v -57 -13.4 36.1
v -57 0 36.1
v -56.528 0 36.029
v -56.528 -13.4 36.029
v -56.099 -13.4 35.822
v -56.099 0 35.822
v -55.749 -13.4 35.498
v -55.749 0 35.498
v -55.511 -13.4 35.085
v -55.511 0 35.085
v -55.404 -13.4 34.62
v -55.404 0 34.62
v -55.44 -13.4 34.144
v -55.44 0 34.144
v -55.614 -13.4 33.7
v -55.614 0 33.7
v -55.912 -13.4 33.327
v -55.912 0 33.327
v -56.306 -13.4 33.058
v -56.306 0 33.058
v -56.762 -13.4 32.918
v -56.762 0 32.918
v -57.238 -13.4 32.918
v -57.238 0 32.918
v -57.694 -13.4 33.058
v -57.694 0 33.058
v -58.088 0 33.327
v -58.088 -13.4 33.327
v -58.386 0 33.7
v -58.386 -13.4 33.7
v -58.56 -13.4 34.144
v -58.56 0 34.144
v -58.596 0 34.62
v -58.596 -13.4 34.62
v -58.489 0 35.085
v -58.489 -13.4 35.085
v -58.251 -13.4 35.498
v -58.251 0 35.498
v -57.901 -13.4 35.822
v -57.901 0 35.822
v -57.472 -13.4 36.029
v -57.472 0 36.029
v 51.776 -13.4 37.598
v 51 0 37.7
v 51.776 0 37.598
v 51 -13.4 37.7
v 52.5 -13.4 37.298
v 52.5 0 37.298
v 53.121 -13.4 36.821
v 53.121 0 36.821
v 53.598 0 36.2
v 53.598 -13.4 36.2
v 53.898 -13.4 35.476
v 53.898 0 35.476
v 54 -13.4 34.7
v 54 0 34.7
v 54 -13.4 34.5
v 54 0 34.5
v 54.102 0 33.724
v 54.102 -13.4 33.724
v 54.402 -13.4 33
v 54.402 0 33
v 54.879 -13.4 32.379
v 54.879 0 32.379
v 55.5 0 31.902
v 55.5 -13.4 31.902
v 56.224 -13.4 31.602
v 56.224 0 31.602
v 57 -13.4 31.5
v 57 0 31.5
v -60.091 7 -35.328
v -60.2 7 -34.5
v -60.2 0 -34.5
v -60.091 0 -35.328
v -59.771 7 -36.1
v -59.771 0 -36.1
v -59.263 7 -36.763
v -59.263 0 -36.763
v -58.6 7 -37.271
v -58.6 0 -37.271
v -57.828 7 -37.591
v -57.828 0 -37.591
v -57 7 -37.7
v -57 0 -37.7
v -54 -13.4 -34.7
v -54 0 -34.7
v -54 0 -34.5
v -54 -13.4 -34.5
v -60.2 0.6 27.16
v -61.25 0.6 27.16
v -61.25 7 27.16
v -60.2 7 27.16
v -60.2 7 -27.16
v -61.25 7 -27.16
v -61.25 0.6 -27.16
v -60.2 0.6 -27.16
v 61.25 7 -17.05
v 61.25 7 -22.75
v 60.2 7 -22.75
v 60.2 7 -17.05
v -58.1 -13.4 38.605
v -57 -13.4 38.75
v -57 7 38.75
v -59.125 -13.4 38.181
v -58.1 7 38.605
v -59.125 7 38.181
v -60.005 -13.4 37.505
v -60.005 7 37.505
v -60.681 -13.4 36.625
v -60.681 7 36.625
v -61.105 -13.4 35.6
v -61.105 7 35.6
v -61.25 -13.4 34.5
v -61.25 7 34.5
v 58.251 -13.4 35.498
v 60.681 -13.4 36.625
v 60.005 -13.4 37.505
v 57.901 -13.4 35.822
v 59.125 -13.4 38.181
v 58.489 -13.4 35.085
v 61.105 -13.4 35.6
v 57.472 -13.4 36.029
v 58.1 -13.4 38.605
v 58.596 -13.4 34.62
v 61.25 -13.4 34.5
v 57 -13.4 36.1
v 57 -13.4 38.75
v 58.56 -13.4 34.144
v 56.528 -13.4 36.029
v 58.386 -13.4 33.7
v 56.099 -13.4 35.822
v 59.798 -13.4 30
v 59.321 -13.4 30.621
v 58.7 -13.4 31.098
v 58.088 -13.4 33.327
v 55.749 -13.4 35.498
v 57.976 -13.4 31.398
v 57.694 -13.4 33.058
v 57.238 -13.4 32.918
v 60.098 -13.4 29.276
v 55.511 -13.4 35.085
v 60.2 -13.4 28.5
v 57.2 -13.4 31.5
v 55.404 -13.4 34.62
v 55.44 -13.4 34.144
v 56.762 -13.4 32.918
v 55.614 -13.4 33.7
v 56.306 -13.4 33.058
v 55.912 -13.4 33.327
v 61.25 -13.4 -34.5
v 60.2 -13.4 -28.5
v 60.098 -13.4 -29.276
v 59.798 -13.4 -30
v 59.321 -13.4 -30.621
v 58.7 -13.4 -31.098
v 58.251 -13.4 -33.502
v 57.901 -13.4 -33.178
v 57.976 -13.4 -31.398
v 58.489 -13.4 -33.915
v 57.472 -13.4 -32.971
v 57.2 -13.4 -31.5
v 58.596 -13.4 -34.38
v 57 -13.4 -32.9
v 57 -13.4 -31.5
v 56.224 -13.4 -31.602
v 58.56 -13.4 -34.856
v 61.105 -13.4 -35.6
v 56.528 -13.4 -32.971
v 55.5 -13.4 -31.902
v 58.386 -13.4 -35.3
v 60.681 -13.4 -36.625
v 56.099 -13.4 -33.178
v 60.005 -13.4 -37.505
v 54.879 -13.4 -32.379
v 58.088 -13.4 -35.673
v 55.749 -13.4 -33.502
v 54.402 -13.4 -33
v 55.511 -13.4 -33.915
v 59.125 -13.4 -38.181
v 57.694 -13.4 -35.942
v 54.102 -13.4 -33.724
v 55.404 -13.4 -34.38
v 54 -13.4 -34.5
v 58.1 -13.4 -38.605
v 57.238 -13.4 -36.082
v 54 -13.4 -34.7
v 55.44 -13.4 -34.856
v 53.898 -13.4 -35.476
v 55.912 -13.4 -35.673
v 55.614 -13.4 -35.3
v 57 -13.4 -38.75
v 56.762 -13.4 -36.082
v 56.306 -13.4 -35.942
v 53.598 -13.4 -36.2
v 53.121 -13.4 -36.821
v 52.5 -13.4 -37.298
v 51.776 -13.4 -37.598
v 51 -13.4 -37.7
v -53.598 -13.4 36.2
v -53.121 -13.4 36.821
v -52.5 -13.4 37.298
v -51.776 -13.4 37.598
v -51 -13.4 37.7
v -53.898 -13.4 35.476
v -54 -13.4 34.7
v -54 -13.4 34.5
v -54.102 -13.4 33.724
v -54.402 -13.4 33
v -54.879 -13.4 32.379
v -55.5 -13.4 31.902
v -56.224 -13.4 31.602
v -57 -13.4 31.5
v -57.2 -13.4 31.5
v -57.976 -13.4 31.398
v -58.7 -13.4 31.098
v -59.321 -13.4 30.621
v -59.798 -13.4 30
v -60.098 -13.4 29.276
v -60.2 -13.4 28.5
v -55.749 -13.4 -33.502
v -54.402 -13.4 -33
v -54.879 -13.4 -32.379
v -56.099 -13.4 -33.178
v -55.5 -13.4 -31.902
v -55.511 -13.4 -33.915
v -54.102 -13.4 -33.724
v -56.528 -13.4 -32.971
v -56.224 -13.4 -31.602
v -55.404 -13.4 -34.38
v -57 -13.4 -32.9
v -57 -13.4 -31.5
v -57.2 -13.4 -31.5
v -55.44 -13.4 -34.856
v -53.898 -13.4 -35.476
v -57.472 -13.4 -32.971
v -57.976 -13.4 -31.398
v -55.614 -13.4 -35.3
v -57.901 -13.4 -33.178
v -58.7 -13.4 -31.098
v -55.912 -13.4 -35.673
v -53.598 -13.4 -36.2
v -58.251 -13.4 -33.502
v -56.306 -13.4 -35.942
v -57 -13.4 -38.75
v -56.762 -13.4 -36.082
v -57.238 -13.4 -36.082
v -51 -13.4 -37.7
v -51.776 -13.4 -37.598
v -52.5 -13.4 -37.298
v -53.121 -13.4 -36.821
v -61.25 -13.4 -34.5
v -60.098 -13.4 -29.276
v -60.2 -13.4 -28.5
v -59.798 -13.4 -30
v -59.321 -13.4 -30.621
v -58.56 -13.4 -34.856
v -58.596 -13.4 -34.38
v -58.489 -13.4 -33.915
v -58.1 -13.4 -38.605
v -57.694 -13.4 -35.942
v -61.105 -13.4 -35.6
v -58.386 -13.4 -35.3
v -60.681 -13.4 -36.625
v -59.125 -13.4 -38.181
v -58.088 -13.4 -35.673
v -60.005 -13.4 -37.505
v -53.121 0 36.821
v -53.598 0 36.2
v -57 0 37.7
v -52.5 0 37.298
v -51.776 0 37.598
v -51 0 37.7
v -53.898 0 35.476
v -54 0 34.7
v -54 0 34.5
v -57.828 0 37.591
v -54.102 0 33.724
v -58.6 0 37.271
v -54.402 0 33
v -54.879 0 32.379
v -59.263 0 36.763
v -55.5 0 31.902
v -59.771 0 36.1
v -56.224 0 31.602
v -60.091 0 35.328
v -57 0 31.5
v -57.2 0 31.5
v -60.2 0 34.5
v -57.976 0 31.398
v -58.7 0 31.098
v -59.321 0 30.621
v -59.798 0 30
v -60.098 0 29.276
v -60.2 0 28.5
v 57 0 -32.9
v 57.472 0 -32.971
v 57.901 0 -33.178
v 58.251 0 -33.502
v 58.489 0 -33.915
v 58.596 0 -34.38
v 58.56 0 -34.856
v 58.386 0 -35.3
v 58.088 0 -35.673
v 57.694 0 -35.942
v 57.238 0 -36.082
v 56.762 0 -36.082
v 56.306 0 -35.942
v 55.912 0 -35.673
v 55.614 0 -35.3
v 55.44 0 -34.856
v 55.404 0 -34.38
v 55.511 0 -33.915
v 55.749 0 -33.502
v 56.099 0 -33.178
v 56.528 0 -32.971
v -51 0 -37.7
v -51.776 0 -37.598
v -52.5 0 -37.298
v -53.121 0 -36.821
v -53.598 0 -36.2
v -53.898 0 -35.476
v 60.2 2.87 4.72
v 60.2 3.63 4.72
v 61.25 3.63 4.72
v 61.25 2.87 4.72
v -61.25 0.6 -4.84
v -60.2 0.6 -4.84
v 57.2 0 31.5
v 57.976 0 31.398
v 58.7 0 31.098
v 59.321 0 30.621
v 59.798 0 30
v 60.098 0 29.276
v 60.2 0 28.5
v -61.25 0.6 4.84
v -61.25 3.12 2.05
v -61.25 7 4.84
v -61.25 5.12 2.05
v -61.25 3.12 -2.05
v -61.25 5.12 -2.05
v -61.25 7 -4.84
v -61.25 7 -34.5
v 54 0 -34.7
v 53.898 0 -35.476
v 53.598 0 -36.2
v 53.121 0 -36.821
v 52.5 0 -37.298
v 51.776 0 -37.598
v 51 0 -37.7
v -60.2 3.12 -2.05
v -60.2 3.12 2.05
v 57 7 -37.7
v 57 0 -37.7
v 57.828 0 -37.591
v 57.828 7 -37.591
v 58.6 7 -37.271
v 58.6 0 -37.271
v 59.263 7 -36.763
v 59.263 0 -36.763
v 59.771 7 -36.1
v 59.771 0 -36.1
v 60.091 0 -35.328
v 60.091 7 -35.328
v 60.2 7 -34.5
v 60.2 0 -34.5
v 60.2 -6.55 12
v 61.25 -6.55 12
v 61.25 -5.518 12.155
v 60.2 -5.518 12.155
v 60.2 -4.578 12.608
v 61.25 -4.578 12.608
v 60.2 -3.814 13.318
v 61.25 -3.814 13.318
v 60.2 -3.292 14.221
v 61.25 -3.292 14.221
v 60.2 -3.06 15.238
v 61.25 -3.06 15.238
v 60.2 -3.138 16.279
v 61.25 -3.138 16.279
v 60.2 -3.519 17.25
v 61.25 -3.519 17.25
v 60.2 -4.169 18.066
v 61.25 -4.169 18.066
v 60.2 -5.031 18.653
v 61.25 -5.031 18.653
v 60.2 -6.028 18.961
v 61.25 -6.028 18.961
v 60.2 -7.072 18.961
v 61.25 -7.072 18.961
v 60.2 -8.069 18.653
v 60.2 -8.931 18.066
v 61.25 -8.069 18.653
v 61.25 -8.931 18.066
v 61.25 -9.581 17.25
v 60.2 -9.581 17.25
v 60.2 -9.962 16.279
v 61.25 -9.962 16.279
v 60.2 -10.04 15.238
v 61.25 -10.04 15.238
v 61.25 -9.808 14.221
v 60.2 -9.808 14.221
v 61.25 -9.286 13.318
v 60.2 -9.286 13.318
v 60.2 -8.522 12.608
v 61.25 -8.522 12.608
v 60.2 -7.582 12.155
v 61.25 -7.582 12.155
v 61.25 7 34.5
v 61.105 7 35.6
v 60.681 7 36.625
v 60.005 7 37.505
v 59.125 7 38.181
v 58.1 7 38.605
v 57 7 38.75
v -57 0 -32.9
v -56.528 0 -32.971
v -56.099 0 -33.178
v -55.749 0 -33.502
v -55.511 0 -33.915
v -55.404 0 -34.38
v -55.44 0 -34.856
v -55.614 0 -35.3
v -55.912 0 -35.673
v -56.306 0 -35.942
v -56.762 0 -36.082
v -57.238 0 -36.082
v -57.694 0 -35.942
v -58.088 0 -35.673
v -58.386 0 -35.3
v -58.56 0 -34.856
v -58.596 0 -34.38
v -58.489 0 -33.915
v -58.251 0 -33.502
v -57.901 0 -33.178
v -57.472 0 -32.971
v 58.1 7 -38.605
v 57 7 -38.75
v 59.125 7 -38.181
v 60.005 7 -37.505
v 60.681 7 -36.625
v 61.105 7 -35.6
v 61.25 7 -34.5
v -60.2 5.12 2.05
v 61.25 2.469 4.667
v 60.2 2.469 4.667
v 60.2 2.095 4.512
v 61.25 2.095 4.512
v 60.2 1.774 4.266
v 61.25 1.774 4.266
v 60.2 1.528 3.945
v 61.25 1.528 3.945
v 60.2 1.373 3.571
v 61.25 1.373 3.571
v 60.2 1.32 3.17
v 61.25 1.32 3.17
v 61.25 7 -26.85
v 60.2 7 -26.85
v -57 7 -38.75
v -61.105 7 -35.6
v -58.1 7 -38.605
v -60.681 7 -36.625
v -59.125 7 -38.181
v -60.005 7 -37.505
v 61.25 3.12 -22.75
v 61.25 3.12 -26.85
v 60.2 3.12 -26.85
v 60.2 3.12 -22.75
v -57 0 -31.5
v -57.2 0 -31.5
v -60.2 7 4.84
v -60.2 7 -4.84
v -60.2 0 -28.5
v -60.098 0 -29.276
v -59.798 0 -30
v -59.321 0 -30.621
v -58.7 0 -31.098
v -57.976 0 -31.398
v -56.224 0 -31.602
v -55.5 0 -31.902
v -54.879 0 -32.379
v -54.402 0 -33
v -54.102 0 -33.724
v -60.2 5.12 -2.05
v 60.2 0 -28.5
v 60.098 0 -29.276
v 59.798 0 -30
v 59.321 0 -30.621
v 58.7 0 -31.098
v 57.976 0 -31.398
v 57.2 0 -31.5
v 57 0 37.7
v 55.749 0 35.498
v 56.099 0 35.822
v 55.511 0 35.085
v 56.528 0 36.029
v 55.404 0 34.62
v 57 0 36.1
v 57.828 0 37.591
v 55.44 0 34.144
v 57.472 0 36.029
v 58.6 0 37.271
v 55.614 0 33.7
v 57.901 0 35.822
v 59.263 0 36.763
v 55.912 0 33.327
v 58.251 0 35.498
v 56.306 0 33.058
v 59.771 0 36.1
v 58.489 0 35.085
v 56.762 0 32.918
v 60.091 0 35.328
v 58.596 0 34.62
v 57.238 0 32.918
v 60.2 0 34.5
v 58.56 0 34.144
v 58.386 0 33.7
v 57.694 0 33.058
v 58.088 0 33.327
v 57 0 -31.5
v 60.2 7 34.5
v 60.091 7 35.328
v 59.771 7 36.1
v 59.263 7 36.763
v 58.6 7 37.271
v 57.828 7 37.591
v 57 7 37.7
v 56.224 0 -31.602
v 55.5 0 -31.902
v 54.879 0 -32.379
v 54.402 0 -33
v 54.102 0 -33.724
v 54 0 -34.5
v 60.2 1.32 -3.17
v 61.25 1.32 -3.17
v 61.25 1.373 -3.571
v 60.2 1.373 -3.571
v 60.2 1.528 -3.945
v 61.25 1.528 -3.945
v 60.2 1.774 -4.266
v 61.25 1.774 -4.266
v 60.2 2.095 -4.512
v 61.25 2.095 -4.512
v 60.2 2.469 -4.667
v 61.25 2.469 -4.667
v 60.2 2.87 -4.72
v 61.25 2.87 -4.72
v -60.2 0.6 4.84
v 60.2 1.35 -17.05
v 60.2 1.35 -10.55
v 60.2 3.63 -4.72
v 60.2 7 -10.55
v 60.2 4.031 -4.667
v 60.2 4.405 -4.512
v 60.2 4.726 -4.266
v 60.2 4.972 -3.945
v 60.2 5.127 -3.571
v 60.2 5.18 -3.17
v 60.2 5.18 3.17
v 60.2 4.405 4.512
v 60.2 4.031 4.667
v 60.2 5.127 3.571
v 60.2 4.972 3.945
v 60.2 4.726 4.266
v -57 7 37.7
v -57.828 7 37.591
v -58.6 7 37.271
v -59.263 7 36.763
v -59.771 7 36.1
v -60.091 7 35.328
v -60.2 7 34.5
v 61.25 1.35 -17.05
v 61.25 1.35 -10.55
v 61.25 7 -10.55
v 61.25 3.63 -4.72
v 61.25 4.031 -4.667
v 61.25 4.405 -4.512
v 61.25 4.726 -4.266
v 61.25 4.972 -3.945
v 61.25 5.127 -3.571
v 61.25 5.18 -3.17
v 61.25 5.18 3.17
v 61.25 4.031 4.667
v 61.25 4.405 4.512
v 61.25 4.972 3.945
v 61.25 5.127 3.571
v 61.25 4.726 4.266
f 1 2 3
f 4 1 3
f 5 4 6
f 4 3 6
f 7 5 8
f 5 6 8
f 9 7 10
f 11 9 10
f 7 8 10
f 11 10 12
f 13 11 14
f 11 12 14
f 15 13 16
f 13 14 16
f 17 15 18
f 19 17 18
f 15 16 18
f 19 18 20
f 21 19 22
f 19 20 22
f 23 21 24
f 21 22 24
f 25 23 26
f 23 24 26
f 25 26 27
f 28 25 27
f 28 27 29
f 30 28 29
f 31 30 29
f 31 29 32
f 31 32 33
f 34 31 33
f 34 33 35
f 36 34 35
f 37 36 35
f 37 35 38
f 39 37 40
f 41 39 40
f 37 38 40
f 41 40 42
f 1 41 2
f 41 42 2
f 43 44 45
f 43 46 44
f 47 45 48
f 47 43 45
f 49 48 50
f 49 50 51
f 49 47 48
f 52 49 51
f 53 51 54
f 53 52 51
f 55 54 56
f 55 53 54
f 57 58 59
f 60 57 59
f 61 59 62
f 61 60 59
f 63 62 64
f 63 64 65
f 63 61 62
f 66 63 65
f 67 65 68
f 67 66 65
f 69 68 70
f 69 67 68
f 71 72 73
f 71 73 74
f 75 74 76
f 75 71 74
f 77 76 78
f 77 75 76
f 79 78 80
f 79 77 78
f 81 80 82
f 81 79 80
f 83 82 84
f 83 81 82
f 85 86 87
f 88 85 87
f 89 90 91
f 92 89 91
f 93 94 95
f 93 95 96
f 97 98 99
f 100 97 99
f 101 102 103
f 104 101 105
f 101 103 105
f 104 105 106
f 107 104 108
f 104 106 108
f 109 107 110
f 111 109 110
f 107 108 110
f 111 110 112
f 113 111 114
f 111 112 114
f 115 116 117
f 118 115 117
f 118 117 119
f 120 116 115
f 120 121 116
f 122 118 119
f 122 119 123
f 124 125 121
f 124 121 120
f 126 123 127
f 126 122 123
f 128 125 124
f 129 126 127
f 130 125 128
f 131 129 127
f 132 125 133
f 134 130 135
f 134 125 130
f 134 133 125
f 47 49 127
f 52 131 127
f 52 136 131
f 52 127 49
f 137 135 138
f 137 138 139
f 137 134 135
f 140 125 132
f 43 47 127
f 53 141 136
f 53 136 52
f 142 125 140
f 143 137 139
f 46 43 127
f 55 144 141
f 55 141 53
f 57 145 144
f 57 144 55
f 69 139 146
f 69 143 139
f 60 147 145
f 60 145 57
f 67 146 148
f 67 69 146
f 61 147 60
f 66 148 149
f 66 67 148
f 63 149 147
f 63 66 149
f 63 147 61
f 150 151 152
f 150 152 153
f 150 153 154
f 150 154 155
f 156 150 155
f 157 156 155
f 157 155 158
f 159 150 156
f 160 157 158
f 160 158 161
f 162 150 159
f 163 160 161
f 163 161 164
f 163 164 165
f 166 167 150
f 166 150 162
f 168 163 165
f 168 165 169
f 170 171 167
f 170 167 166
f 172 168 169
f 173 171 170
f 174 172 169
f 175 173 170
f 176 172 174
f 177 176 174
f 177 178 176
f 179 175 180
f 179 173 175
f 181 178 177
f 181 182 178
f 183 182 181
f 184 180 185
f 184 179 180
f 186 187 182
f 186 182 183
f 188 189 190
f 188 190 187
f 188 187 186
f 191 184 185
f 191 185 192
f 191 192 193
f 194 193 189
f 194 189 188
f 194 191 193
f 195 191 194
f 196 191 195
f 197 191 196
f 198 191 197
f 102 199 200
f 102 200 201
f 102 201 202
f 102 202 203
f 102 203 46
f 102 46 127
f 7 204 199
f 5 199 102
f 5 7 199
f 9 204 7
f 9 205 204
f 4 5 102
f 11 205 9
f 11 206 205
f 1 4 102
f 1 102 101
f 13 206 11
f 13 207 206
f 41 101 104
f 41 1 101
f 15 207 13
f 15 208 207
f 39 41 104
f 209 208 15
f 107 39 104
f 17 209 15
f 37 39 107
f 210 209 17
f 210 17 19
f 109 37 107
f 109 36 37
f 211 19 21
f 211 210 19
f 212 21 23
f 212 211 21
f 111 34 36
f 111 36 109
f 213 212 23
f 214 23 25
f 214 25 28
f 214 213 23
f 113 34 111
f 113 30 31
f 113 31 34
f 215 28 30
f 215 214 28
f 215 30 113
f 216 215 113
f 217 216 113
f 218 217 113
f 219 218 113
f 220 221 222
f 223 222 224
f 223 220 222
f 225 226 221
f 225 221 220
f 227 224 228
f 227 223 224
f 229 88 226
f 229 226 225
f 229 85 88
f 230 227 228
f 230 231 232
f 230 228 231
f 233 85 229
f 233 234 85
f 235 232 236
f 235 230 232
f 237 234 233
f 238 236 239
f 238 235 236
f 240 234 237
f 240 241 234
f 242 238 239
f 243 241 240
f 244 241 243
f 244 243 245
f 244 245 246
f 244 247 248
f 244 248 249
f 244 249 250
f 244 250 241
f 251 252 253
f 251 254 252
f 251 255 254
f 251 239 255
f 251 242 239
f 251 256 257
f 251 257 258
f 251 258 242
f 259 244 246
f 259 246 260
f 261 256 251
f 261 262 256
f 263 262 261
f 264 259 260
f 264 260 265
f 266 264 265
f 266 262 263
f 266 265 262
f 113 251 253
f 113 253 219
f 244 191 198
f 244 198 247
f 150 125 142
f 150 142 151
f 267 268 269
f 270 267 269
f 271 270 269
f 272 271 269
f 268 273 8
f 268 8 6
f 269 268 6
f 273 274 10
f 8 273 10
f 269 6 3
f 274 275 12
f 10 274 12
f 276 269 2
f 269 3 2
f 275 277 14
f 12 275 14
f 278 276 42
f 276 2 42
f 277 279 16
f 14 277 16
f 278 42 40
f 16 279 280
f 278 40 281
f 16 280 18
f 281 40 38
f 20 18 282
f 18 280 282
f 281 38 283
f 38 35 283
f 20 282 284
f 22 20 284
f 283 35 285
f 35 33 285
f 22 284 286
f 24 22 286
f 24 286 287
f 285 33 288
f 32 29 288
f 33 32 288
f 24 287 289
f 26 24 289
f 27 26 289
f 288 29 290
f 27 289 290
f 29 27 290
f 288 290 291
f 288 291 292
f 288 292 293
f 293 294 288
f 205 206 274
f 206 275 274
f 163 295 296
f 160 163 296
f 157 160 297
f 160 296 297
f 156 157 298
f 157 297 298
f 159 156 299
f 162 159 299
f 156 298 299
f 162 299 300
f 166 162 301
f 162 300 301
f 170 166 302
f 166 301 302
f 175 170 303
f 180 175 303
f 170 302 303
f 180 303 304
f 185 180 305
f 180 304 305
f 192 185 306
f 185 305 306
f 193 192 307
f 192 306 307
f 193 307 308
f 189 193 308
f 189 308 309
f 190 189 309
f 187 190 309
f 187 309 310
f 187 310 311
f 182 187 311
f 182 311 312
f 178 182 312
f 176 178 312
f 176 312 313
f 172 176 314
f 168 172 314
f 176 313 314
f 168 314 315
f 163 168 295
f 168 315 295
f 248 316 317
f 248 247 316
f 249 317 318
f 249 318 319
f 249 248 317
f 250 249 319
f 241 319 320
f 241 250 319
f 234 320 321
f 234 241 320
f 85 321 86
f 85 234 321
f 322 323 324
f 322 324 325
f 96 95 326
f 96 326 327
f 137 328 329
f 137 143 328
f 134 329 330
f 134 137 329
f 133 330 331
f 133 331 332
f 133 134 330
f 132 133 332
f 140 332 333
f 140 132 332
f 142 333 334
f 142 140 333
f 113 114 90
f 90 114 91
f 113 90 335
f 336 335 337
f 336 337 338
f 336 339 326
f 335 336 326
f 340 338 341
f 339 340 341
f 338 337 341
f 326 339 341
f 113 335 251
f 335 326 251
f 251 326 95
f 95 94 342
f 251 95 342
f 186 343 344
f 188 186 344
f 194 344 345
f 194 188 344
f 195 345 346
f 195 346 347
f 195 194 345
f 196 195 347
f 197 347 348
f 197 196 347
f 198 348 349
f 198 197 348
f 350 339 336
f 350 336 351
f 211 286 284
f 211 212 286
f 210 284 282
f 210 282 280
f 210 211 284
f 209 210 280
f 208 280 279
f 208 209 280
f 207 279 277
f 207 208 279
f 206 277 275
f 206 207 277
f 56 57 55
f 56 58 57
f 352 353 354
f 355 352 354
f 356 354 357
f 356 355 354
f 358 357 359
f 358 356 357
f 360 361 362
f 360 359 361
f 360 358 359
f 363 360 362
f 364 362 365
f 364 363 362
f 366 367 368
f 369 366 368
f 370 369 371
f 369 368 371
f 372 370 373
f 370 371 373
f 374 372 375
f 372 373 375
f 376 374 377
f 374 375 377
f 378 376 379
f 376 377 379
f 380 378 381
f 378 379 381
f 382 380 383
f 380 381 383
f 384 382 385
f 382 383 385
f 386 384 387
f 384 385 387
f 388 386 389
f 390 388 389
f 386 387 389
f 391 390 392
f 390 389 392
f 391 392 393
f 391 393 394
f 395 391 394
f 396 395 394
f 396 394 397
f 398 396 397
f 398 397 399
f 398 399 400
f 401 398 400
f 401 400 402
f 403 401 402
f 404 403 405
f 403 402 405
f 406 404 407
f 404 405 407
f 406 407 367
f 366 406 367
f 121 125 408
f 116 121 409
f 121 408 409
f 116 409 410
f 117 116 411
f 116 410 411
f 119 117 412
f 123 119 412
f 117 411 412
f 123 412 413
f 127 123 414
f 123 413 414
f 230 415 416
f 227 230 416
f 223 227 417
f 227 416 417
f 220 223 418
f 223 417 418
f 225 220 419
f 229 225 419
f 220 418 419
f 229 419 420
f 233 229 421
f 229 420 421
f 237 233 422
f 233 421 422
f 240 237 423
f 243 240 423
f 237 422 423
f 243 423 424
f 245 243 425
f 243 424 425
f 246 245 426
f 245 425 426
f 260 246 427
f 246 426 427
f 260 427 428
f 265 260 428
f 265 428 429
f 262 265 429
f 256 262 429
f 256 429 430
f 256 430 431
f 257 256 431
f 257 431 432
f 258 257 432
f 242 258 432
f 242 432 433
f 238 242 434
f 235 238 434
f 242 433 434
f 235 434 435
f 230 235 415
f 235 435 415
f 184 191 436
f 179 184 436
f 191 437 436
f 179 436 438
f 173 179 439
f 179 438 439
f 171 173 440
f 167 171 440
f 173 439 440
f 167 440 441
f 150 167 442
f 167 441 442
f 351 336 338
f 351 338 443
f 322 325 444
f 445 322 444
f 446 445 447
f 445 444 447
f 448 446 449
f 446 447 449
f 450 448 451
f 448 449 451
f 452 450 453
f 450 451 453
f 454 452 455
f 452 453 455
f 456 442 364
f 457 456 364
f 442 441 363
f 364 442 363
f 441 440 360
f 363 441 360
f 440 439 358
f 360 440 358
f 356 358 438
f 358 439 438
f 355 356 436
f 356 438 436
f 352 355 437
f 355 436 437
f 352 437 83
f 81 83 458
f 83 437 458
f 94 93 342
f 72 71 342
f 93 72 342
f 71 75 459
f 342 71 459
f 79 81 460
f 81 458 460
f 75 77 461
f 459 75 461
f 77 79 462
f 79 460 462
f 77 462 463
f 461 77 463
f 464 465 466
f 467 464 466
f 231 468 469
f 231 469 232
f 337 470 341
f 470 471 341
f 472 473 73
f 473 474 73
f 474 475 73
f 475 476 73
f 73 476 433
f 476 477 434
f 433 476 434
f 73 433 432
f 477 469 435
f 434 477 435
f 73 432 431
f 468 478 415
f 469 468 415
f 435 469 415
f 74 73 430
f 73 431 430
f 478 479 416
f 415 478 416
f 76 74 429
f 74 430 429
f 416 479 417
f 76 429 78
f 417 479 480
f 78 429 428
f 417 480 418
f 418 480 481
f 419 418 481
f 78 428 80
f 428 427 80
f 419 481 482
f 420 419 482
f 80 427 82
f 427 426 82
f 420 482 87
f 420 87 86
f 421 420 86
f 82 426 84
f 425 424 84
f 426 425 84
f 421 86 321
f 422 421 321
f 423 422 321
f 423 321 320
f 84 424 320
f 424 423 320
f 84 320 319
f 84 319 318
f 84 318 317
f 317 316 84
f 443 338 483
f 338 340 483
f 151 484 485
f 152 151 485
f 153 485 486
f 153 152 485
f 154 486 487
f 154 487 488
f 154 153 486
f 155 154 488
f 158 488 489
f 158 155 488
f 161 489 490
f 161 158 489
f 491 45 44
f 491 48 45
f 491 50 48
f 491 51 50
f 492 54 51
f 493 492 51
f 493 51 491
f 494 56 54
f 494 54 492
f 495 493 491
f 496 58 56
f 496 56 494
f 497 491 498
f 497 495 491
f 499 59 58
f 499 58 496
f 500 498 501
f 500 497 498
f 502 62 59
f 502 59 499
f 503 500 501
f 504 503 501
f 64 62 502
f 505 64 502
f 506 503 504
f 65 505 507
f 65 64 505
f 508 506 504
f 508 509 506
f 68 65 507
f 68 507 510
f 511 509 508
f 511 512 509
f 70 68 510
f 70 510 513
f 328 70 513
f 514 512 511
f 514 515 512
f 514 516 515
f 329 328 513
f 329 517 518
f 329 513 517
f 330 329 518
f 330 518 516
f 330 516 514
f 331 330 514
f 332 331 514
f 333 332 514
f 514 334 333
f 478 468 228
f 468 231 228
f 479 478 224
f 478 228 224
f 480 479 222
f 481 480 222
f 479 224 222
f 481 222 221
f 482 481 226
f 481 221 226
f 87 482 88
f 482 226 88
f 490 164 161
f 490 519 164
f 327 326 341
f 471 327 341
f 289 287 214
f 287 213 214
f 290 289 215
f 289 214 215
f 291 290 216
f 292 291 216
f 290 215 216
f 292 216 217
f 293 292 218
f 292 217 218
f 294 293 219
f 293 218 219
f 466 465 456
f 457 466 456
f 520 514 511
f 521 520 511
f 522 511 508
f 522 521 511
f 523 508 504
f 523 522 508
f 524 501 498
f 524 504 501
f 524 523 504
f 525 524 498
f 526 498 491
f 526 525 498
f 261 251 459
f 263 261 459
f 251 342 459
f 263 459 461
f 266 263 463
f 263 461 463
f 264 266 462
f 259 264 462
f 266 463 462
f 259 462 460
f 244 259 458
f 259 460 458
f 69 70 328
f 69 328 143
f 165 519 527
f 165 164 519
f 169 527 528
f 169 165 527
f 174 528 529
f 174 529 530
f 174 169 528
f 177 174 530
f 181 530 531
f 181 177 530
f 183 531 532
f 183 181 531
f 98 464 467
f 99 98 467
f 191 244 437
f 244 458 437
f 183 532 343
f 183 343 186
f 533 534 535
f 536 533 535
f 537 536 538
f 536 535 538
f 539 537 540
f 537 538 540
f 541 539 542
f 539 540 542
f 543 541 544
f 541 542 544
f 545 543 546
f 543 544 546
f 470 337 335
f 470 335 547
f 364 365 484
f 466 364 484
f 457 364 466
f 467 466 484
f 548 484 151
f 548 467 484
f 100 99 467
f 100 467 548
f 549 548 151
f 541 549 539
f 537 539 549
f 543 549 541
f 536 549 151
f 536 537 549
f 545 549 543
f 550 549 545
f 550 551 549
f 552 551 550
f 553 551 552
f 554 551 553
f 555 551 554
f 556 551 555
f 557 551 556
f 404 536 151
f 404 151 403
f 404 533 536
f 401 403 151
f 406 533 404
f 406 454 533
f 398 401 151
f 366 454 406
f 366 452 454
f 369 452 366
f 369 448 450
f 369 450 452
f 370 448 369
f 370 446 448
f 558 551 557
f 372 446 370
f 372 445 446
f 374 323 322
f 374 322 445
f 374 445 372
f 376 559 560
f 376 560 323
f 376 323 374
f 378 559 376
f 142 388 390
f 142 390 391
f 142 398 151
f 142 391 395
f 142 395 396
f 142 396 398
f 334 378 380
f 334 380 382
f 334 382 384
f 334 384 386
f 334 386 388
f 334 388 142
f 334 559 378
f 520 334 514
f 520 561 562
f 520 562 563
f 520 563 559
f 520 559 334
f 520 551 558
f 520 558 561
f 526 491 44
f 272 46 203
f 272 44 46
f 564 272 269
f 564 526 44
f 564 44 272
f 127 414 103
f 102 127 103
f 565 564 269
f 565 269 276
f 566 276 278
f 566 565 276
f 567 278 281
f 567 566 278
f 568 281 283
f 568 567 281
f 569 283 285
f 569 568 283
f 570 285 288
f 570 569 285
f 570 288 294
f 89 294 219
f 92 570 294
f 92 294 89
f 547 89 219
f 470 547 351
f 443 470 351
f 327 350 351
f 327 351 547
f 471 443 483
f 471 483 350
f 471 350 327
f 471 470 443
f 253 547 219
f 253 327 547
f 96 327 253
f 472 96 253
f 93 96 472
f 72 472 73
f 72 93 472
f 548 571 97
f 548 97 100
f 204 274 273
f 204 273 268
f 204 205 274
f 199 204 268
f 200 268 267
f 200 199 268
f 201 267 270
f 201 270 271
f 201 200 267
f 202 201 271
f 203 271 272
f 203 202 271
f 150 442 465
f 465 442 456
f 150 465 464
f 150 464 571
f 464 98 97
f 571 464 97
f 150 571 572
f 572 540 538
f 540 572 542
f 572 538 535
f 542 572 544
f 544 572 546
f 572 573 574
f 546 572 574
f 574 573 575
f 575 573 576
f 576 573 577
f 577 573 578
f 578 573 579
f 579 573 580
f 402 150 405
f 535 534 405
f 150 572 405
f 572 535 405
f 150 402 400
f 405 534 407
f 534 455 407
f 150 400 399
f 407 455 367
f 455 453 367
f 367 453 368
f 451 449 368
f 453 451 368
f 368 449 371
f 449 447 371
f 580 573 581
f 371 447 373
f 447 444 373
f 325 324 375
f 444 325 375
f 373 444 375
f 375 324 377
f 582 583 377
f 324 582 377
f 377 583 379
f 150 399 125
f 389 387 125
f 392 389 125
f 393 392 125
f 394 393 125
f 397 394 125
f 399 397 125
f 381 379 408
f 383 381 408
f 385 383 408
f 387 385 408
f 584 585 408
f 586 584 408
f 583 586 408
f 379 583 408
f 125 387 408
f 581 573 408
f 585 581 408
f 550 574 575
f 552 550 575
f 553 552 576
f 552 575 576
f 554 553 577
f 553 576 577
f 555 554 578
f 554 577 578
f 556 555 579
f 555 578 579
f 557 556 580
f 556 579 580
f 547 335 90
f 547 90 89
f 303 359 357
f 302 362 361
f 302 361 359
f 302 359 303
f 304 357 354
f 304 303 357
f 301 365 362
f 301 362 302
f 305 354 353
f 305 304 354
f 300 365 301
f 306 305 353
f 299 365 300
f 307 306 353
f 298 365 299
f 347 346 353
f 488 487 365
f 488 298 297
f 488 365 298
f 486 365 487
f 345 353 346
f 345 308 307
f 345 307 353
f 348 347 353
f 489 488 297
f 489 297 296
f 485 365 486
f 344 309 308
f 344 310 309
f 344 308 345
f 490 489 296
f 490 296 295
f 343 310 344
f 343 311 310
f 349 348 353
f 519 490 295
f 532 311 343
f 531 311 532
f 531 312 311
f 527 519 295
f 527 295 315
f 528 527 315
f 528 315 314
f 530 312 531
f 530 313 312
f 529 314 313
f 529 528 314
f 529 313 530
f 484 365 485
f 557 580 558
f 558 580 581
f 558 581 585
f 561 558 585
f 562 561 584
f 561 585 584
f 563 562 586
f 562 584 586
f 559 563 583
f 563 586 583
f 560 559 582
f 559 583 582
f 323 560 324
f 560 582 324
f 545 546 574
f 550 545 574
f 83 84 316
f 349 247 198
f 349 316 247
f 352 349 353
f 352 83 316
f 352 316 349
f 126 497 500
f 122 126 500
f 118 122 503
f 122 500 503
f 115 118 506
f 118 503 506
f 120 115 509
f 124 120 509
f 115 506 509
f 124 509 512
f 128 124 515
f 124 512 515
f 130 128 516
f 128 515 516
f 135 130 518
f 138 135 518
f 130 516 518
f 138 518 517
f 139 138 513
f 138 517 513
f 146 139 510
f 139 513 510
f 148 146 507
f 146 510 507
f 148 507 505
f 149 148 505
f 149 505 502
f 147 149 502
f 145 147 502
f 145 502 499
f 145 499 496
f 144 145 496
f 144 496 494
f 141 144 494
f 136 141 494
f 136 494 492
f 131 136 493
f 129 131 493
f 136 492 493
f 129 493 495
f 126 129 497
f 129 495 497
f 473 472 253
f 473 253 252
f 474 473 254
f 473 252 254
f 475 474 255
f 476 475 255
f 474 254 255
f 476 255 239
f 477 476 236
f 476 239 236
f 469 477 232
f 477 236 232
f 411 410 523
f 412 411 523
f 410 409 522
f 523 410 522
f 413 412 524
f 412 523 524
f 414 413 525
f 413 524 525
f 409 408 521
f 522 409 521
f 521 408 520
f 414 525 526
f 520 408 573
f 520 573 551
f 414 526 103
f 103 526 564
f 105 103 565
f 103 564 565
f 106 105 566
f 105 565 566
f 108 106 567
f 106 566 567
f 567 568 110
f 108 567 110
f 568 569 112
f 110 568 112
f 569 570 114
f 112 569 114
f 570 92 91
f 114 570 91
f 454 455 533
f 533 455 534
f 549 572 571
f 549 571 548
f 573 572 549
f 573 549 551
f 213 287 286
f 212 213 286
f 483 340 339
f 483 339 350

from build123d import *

# Parameters (mm, degrees)
WALLS_DEPTH         = 7
WALLS_DEPTH_BACK    = 13.4
SKETCH11_R          = 1.6
BOSS_EXTRUDE4_DEPTH = 13.4
MOVE_FACE7_BY       = 0.2
MOVE_FACE7_2_BY     = 0.2
MOVE_FACE7_3_BY     = 0.2
MOVE_FACE7_4_BY     = 0.2
MOVE_FACE7_5_BY     = 0.2
MOVE_FACE7_6_BY     = 0.2
MOVE_FACE7_7_BY     = 0.2
MOVE_FACE7_8_BY     = 0.2
FILLET1_R           = 3
SKETCH8_R           = 3.25
SKETCH8_W           = 6
SKETCH8_H           = 5.22
CUT_EXTRUDE3_DEPTH  = 1.05
CUT_EXTRUDE4_REACH  = 131.18
SKETCH10_W          = 20.32
SKETCH10_H          = 5.4
SKETCH10_W_2        = 3.6
SKETCH10_H_2        = 1.5
MOVE_FACE3_BY       = 0.25
MOVE_FACE3_2_BY     = 0.25
MOVE_FACE3_3_BY     = 0.25
MOVE_FACE4_BY       = 0.25
MOVE_FACE4_2_BY     = 0.25
MOVE_FACE4_3_BY     = 0.25
MOVE_FACE4_4_BY     = 0.25
MOVE_FACE4_5_BY     = 0.25
MOVE_FACE4_6_BY     = 0.25
MOVE_FACE4_7_BY     = 0.25
MOVE_FACE4_8_BY     = 0.25
MOVE_FACE4_9_BY     = 0.25
MOVE_FACE4_10_BY    = 0.25
MOVE_FACE4_11_BY    = 0.25
MOVE_FACE4_12_BY    = 0.25
MOVE_FACE4_13_BY    = 0.25
MOVE_FACE1_BY       = 1
MOVE_FACE1_2_BY     = 1
MOVE_FACE1_3_BY     = 1
MOVE_FACE1_4_BY     = 1
MOVE_FACE1_5_BY     = 1
MOVE_FACE1_6_BY     = 1
MOVE_FACE2_BY       = 0.25
MOVE_FACE2_2_BY     = 0.25
MOVE_FACE2_3_BY     = 0.25
MOVE_FACE2_4_BY     = 0.25
SKETCH4_R           = 2.15
BOTTOM_LID_DEPTH    = 3
SKETCH5_R           = 5.5
SKETCH5_R_2         = 1.6
SKETCH5_W           = 7.62
SKETCH5_H           = 2.54
TOP_LID_DEPTH       = 1.6
MOVE_FACE5_BY       = 0.25
MOVE_FACE5_2_BY     = 0.25
MOVE_FACE5_3_BY     = 0.25
MOVE_FACE5_4_BY     = 0.25


with BuildPart() as part:
    # Sketch2 → Walls (new, two sides)
    with BuildSketch(Plane(origin=(0, 0, 0), x_dir=(1, 0, 0), z_dir=(0, 1, 0))) as walls_sk:
        with BuildLine():
            Line((-61.25, -34.5), (-61.25, 34.5))
            ThreePointArc((-61.25, 34.5), (-60.00520382, 37.50520382), (-57, 38.75))
            Line((-57, 38.75), (57, 38.75))
            ThreePointArc((57, 38.75), (60.00520382, 37.50520382), (61.25, 34.5))
            Line((61.25, 34.5), (61.25, -34.5))
            ThreePointArc((61.25, -34.5), (60.00520382, -37.50520382), (57, -38.75))
            Line((57, -38.75), (-57, -38.75))
            ThreePointArc((-57, -38.75), (-60.00520382, -37.50520382), (-61.25, -34.5))
        make_face()
        with BuildLine():
            Line((-60, -34.5), (-60, 34.5))
            ThreePointArc((-60, 34.5), (-59.121320344, 36.621320344), (-57, 37.5))
            Line((-57, 37.5), (57, 37.5))
            ThreePointArc((57, 37.5), (59.121320344, 36.621320344), (60, 34.5))
            Line((60, 34.5), (60, -34.5))
            ThreePointArc((60, -34.5), (59.121320344, -36.621320344), (57, -37.5))
            Line((57, -37.5), (-57, -37.5))
            ThreePointArc((-57, -37.5), (-59.121320344, -36.621320344), (-60, -34.5))
        make_face(mode=Mode.SUBTRACT)
    extrude(amount=WALLS_DEPTH)
    extrude(walls_sk.sketch, amount=-WALLS_DEPTH_BACK)

    # Sketch11 → Boss-Extrude4 (add)
    with BuildSketch(Plane(origin=(0, 0, 0), x_dir=(1, 0, 0), z_dir=(0, 1, 0))):
        with BuildLine():
            Line((-60, -34.5), (-60, -31.5))
            Line((-60, -31.5), (-54, -31.5))
            Line((-54, -31.5), (-54, -37.5))
            Line((-54, -37.5), (-57, -37.5))
            ThreePointArc((-57, -37.5), (-59.121320344, -36.621320344), (-60, -34.5))
        make_face()
        with Locations(Location((-57, -34.5, 0), (0, 0, 270))):
            Circle(SKETCH11_R, mode=Mode.SUBTRACT)
        with BuildLine():
            Line((-57, 37.5), (-54, 37.5))
            Line((-54, 37.5), (-54, 31.5))
            Line((-54, 31.5), (-60, 31.5))
            Line((-60, 31.5), (-60, 34.5))
            ThreePointArc((-60, 34.5), (-59.121320344, 36.621320344), (-57, 37.5))
        make_face()
        with Locations(Location((-57, 34.5, 0), (0, 0, 270))):
            Circle(SKETCH11_R, mode=Mode.SUBTRACT)
        with BuildLine():
            Line((60, -31.5), (54, -31.5))
            Line((54, -31.5), (54, -37.5))
            Line((54, -37.5), (57, -37.5))
            ThreePointArc((57, -37.5), (59.121320344, -36.621320344), (60, -34.5))
            Line((60, -34.5), (60, -31.5))
        make_face()
        with Locations(Location((57, -34.5, 0), (0, 0, 270))):
            Circle(SKETCH11_R, mode=Mode.SUBTRACT)
        with BuildLine():
            Line((57, 37.5), (54, 37.5))
            Line((54, 37.5), (54, 31.5))
            Line((54, 31.5), (60, 31.5))
            Line((60, 31.5), (60, 34.5))
            ThreePointArc((60, 34.5), (59.121320344, 36.621320344), (57, 37.5))
        make_face()
        with Locations(Location((57, 34.5, 0), (0, 0, 270))):
            Circle(SKETCH11_R, mode=Mode.SUBTRACT)
    extrude(amount=-BOSS_EXTRUDE4_DEPTH)

    # Move Face7: a curved face moved inward by 0.2
    add(Solid.thicken(part.faces().sort_by_distance((59.121320344, 3.5, 36.621320344))[0], -MOVE_FACE7_BY), mode=Mode.SUBTRACT)

    # Move Face7 2: a face moved inward by 0.2
    extrude(part.faces().sort_by_distance((60, -2.987974684, 0))[0], amount=MOVE_FACE7_2_BY, dir=(1, 0, 0), mode=Mode.SUBTRACT)

    # Move Face7 3: a curved face moved inward by 0.2
    add(Solid.thicken(part.faces().sort_by_distance((59.121320344, 3.5, -36.621320344))[0], -MOVE_FACE7_3_BY), mode=Mode.SUBTRACT)

    # Move Face7 4: a face moved inward by 0.2
    extrude(part.faces().sort_by_distance((0, -3.074665954, -37.5))[0], amount=MOVE_FACE7_4_BY, dir=(0, 0, -1), mode=Mode.SUBTRACT)

    # Move Face7 5: a curved face moved inward by 0.2
    add(Solid.thicken(part.faces().sort_by_distance((-59.121320344, 3.5, -36.621320344))[0], -MOVE_FACE7_5_BY), mode=Mode.SUBTRACT)

    # Move Face7 6: a face moved inward by 0.2
    extrude(part.faces().sort_by_distance((-60, -2.987974684, 0))[0], amount=MOVE_FACE7_6_BY, dir=(-1, 0, 0), mode=Mode.SUBTRACT)

    # Move Face7 7: a face moved inward by 0.2
    extrude(part.faces().sort_by_distance((0, -3.074665954, 37.5))[0], amount=MOVE_FACE7_7_BY, dir=(0, 0, 1), mode=Mode.SUBTRACT)

    # Move Face7 8: a curved face moved inward by 0.2
    add(Solid.thicken(part.faces().sort_by_distance((-59.121320344, 3.5, 36.621320344))[0], -MOVE_FACE7_8_BY), mode=Mode.SUBTRACT)

    # Fillet1
    fillet1_edges = [part.edges().sort_by_distance(p)[0] for p in [
        (-60.2, -6.7, -31.5),
        (-54, -6.7, -31.5),
        (-54, -6.7, -37.7),
        (54, -6.7, 31.5),
        (54, -6.7, 37.7),
        (60.2, -6.7, 31.5),
        (54, -6.7, -37.7),
        (54, -6.7, -31.5),
        (60.2, -6.7, -31.5),
        (-54, -6.7, 37.7),
        (-54, -6.7, 31.5),
        (-60.2, -6.7, 31.5),
    ]]
    fillet(fillet1_edges, radius=FILLET1_R)

    # Sketch8 → Cut-Extrude3 (cut)
    with BuildSketch(Plane(origin=(61.25, 0, 0), x_dir=(0, 0, -1), z_dir=(1, 0, 0))):
        with Locations((-15.5, -6.55)):
            Circle(SKETCH8_R)
        with BuildLine():
            Line((-3.17, 1.57), (3.17, 1.57))
            ThreePointArc((3.17, 1.57), (4.089238816, 1.950761184), (4.47, 2.87))
            Line((4.47, 2.87), (4.47, 3.63))
            ThreePointArc((4.47, 3.63), (4.089238816, 4.549238816), (3.17, 4.93))
            Line((3.17, 4.93), (-3.17, 4.93))
            ThreePointArc((-3.17, 4.93), (-4.089238816, 4.549238816), (-4.47, 3.63))
            Line((-4.47, 3.63), (-4.47, 2.87))
            ThreePointArc((-4.47, 2.87), (-4.089238816, 1.950761184), (-3.17, 1.57))
        make_face()
        Polygon((23, 4.87), (23, 7), (26.6, 7), (26.6, 4.87), (26.6, 3.37), (23, 3.37), align=None)
        with Locations((13.8, 4.21)):
            Rectangle(SKETCH8_W, SKETCH8_H)
    extrude(amount=-CUT_EXTRUDE3_DEPTH, mode=Mode.SUBTRACT)

    # Sketch10 → Cut-Extrude4 (cut, up to next)
    with BuildSketch(Plane.ZY.offset(61.25), mode=Mode.PRIVATE) as cut_extrude4_sk1:
        with Locations((16, 4.3)):
            Rectangle(SKETCH10_W, SKETCH10_H)
    cut_extrude4_tool1 = extrude(cut_extrude4_sk1.sketch, amount=-CUT_EXTRUDE4_REACH, mode=Mode.PRIVATE) & part.part
    # Sketch10 → Cut-Extrude4 (cut, up to next)
    with BuildSketch(Plane.ZY.offset(61.25), mode=Mode.PRIVATE) as cut_extrude4_sk2:
        with Locations((-16, 4.3)):
            Rectangle(SKETCH10_W, SKETCH10_H)
    cut_extrude4_tool2 = extrude(cut_extrude4_sk2.sketch, amount=-CUT_EXTRUDE4_REACH, mode=Mode.PRIVATE) & part.part
    # Sketch10 → Cut-Extrude4 (cut, up to next)
    with BuildSketch(Plane.ZY.offset(61.25), mode=Mode.PRIVATE) as cut_extrude4_sk3:
        with Locations((0, 4.12)):
            Rectangle(SKETCH10_W_2, SKETCH10_H_2)
    cut_extrude4_tool3 = extrude(cut_extrude4_sk3.sketch, amount=-CUT_EXTRUDE4_REACH, mode=Mode.PRIVATE) & part.part
    add(cut_extrude4_tool1.solids().sort_by_distance((-61.25, 4.3, 16))[0], mode=Mode.SUBTRACT)
    add(cut_extrude4_tool2.solids().sort_by_distance((-61.25, 4.3, -16))[0], mode=Mode.SUBTRACT)
    add(cut_extrude4_tool3.solids().sort_by_distance((-61.25, 4.12, 0))[0], mode=Mode.SUBTRACT)

    # Move Face3: a face moved inward by 0.25
    extrude(part.faces().sort_by_distance((60.725, 5.185, -23))[0], amount=MOVE_FACE3_BY, dir=(0, 0, 1), mode=Mode.SUBTRACT)

    # Move Face3 2: a face moved inward by 0.25
    extrude(part.faces().sort_by_distance((60.725, 5.185, -26.6))[0], amount=MOVE_FACE3_2_BY, dir=(0, 0, -1), mode=Mode.SUBTRACT)

    # Move Face3 3: a face moved inward by 0.25
    extrude(part.faces().sort_by_distance((60.725, 3.37, -24.8))[0], amount=MOVE_FACE3_3_BY, dir=(0, -1, 0), mode=Mode.SUBTRACT)

    # Move Face4: a curved face moved inward by 0.25
    add(Solid.thicken(part.faces().sort_by_distance((60.725, -6.55, 18.75))[0], -MOVE_FACE4_BY), mode=Mode.SUBTRACT)

    # Move Face4 2: a curved face moved inward by 0.25
    add(Solid.thicken(part.faces().sort_by_distance((60.725, 1.950761184, 4.089238816))[0], -MOVE_FACE4_2_BY), mode=Mode.SUBTRACT)

    # Move Face4 3: a face moved inward by 0.25
    extrude(part.faces().sort_by_distance((60.725, 3.25, 4.47))[0], amount=MOVE_FACE4_3_BY, dir=(0, 0, 1), mode=Mode.SUBTRACT)

    # Move Face4 4: a curved face moved inward by 0.25
    add(Solid.thicken(part.faces().sort_by_distance((60.725, 4.549238816, 4.089238816))[0], -MOVE_FACE4_4_BY), mode=Mode.SUBTRACT)

    # Move Face4 5: a face moved inward by 0.25
    extrude(part.faces().sort_by_distance((60.725, 4.93, 0))[0], amount=MOVE_FACE4_5_BY, dir=(0, 1, 0), mode=Mode.SUBTRACT)

    # Move Face4 6: a curved face moved inward by 0.25
    add(Solid.thicken(part.faces().sort_by_distance((60.725, 1.950761184, -4.089238816))[0], -MOVE_FACE4_6_BY), mode=Mode.SUBTRACT)

    # Move Face4 7: a face moved inward by 0.25
    extrude(part.faces().sort_by_distance((60.725, 1.57, 0))[0], amount=MOVE_FACE4_7_BY, dir=(0, -1, 0), mode=Mode.SUBTRACT)

    # Move Face4 8: a face moved inward by 0.25
    extrude(part.faces().sort_by_distance((60.725, 3.25, -4.47))[0], amount=MOVE_FACE4_8_BY, dir=(0, 0, -1), mode=Mode.SUBTRACT)

    # Move Face4 9: a curved face moved inward by 0.25
    add(Solid.thicken(part.faces().sort_by_distance((60.725, 4.549238816, -4.089238816))[0], -MOVE_FACE4_9_BY), mode=Mode.SUBTRACT)

    # Move Face4 10: a face moved inward by 0.25
    extrude(part.faces().sort_by_distance((60.725, 1.6, -13.8))[0], amount=MOVE_FACE4_10_BY, dir=(0, -1, 0), mode=Mode.SUBTRACT)

    # Move Face4 11: a face moved inward by 0.25
    extrude(part.faces().sort_by_distance((60.725, 4.21, -16.8))[0], amount=MOVE_FACE4_11_BY, dir=(0, 0, -1), mode=Mode.SUBTRACT)

    # Move Face4 12: a face moved inward by 0.25
    extrude(part.faces().sort_by_distance((60.725, 4.21, -10.8))[0], amount=MOVE_FACE4_12_BY, dir=(0, 0, 1), mode=Mode.SUBTRACT)

    # Move Face4 13: a face moved inward by 0.25
    extrude(part.faces().sort_by_distance((60.725, 6.82, -13.8))[0], amount=MOVE_FACE4_13_BY, dir=(0, 1, 0), mode=Mode.SUBTRACT)

    # Move Face1: a face moved inward by 1.0
    extrude(part.faces().sort_by_distance((-60.725, 4.3, 26.16))[0], amount=MOVE_FACE1_BY, dir=(0, 0, 1), mode=Mode.SUBTRACT)

    # Move Face1 2: a face moved inward by 1.0
    extrude(part.faces().sort_by_distance((-60.725, 1.6, 16))[0], amount=MOVE_FACE1_2_BY, dir=(0, -1, 0), mode=Mode.SUBTRACT)

    # Move Face1 3: a face moved inward by 1.0
    extrude(part.faces().sort_by_distance((-60.725, 4.3, 5.84))[0], amount=MOVE_FACE1_3_BY, dir=(0, 0, -1), mode=Mode.SUBTRACT)

    # Move Face1 4: a face moved inward by 1.0
    extrude(part.faces().sort_by_distance((-60.725, 4.3, -26.16))[0], amount=MOVE_FACE1_4_BY, dir=(0, 0, -1), mode=Mode.SUBTRACT)

    # Move Face1 5: a face moved inward by 1.0
    extrude(part.faces().sort_by_distance((-60.725, 1.6, -16))[0], amount=MOVE_FACE1_5_BY, dir=(0, -1, 0), mode=Mode.SUBTRACT)

    # Move Face1 6: a face moved inward by 1.0
    extrude(part.faces().sort_by_distance((-60.725, 4.3, -5.84))[0], amount=MOVE_FACE1_6_BY, dir=(0, 0, 1), mode=Mode.SUBTRACT)

    # Move Face2: a face moved inward by 0.25
    extrude(part.faces().sort_by_distance((-60.725, 4.12, -1.8))[0], amount=MOVE_FACE2_BY, dir=(0, 0, -1), mode=Mode.SUBTRACT)

    # Move Face2 2: a face moved inward by 0.25
    extrude(part.faces().sort_by_distance((-60.725, 4.87, 0))[0], amount=MOVE_FACE2_2_BY, dir=(0, 1, 0), mode=Mode.SUBTRACT)

    # Move Face2 3: a face moved inward by 0.25
    extrude(part.faces().sort_by_distance((-60.725, 3.37, 0))[0], amount=MOVE_FACE2_3_BY, dir=(0, -1, 0), mode=Mode.SUBTRACT)

    # Move Face2 4: a face moved inward by 0.25
    extrude(part.faces().sort_by_distance((-60.725, 4.12, 1.8))[0], amount=MOVE_FACE2_4_BY, dir=(0, 0, 1), mode=Mode.SUBTRACT)


with BuildPart() as body_2:
    # Sketch4 → Bottom Lid (new body)
    with BuildSketch(Plane.XZ.offset(13.4)):
        with BuildLine():
            Line((-57, -38.75), (57, -38.75))
            ThreePointArc((57, -38.75), (60.00520382, -37.50520382), (61.25, -34.5))
            Line((61.25, -34.5), (61.25, 34.5))
            ThreePointArc((61.25, 34.5), (60.00520382, 37.50520382), (57, 38.75))
            Line((57, 38.75), (-57, 38.75))
            ThreePointArc((-57, 38.75), (-60.00520382, 37.50520382), (-61.25, 34.5))
            Line((-61.25, 34.5), (-61.25, -34.5))
            ThreePointArc((-61.25, -34.5), (-60.00520382, -37.50520382), (-57, -38.75))
        make_face()
        with Locations(Location((57, -34.5, 0), (0, 0, 270))):
            Circle(SKETCH4_R, mode=Mode.SUBTRACT)
        with Locations(Location((-57, -34.5, 0), (0, 0, 270))):
            Circle(SKETCH4_R, mode=Mode.SUBTRACT)
        with Locations(Location((-57, 34.5, 0), (0, 0, 270))):
            Circle(SKETCH4_R, mode=Mode.SUBTRACT)
        with Locations(Location((57, 34.5, 0), (0, 0, 270))):
            Circle(SKETCH4_R, mode=Mode.SUBTRACT)
    extrude(amount=BOTTOM_LID_DEPTH)


with BuildPart() as body_3:
    # Sketch5 → Top Lid (new body)
    with BuildSketch(Plane(origin=(0, 7, 0), x_dir=(1, 0, 0), z_dir=(0, 1, 0))):
        with BuildLine():
            Line((57, 38.75), (-57, 38.75))
            ThreePointArc((-57, 38.75), (-60.00520382, 37.50520382), (-61.25, 34.5))
            Line((-61.25, 34.5), (-61.25, -34.5))
            ThreePointArc((-61.25, -34.5), (-60.00520382, -37.50520382), (-57, -38.75))
            Line((-57, -38.75), (57, -38.75))
            ThreePointArc((57, -38.75), (60.00520382, -37.50520382), (61.25, -34.5))
            Line((61.25, -34.5), (61.25, 34.5))
            ThreePointArc((61.25, 34.5), (60.00520382, 37.50520382), (57, 38.75))
        make_face()
        with Locations(Location((42, 27.5, 0), (0, 0, 270))):
            Circle(SKETCH5_R, mode=Mode.SUBTRACT)
        with Locations(Location((-14, 27.5, 0), (0, 0, 270))):
            Circle(SKETCH5_R, mode=Mode.SUBTRACT)
        with Locations(Location((14, 27.5, 0), (0, 0, 270))):
            Circle(SKETCH5_R, mode=Mode.SUBTRACT)
        with Locations(Location((-42, 27.5, 0), (0, 0, 270))):
            Circle(SKETCH5_R, mode=Mode.SUBTRACT)
        with Locations(Location((42, -27.5, 0), (0, 0, 270))):
            Circle(SKETCH5_R, mode=Mode.SUBTRACT)
        with Locations(Location((14, -27.5, 0), (0, 0, 270))):
            Circle(SKETCH5_R, mode=Mode.SUBTRACT)
        with Locations(Location((-14, -27.5, 0), (0, 0, 270))):
            Circle(SKETCH5_R, mode=Mode.SUBTRACT)
        with Locations(Location((-42, -27.5, 0), (0, 0, 270))):
            Circle(SKETCH5_R, mode=Mode.SUBTRACT)
        with Locations(Location((-57, -34.5, 0), (0, 0, 270))):
            Circle(SKETCH5_R_2, mode=Mode.SUBTRACT)
        with Locations(Location((-57, 34.5, 0), (0, 0, 270))):
            Circle(SKETCH5_R_2, mode=Mode.SUBTRACT)
        with Locations(Location((57, 34.5, 0), (0, 0, 270))):
            Circle(SKETCH5_R_2, mode=Mode.SUBTRACT)
        with Locations(Location((57, -34.5, 0), (0, 0, 270))):
            Circle(SKETCH5_R_2, mode=Mode.SUBTRACT)
        with Locations((6.24, 11.2375)):
            Rectangle(SKETCH5_W, SKETCH5_H, mode=Mode.SUBTRACT)
    extrude(amount=TOP_LID_DEPTH)

    # Move Face5: a face moved inward by 0.25
    extrude(body_3.faces().sort_by_distance((2.43, 7.8, -11.2375))[0], amount=MOVE_FACE5_BY, dir=(-1, 0, 0), mode=Mode.SUBTRACT)

    # Move Face5 2: a face moved inward by 0.25
    extrude(body_3.faces().sort_by_distance((6.24, 7.8, -9.9675))[0], amount=MOVE_FACE5_2_BY, dir=(0, 0, 1), mode=Mode.SUBTRACT)

    # Move Face5 3: a face moved inward by 0.25
    extrude(body_3.faces().sort_by_distance((10.05, 7.8, -11.2375))[0], amount=MOVE_FACE5_3_BY, dir=(1, 0, 0), mode=Mode.SUBTRACT)

    # Move Face5 4: a face moved inward by 0.25
    extrude(body_3.faces().sort_by_distance((6.24, 7.8, -12.5075))[0], amount=MOVE_FACE5_4_BY, dir=(0, 0, -1), mode=Mode.SUBTRACT)


solid = part.part
